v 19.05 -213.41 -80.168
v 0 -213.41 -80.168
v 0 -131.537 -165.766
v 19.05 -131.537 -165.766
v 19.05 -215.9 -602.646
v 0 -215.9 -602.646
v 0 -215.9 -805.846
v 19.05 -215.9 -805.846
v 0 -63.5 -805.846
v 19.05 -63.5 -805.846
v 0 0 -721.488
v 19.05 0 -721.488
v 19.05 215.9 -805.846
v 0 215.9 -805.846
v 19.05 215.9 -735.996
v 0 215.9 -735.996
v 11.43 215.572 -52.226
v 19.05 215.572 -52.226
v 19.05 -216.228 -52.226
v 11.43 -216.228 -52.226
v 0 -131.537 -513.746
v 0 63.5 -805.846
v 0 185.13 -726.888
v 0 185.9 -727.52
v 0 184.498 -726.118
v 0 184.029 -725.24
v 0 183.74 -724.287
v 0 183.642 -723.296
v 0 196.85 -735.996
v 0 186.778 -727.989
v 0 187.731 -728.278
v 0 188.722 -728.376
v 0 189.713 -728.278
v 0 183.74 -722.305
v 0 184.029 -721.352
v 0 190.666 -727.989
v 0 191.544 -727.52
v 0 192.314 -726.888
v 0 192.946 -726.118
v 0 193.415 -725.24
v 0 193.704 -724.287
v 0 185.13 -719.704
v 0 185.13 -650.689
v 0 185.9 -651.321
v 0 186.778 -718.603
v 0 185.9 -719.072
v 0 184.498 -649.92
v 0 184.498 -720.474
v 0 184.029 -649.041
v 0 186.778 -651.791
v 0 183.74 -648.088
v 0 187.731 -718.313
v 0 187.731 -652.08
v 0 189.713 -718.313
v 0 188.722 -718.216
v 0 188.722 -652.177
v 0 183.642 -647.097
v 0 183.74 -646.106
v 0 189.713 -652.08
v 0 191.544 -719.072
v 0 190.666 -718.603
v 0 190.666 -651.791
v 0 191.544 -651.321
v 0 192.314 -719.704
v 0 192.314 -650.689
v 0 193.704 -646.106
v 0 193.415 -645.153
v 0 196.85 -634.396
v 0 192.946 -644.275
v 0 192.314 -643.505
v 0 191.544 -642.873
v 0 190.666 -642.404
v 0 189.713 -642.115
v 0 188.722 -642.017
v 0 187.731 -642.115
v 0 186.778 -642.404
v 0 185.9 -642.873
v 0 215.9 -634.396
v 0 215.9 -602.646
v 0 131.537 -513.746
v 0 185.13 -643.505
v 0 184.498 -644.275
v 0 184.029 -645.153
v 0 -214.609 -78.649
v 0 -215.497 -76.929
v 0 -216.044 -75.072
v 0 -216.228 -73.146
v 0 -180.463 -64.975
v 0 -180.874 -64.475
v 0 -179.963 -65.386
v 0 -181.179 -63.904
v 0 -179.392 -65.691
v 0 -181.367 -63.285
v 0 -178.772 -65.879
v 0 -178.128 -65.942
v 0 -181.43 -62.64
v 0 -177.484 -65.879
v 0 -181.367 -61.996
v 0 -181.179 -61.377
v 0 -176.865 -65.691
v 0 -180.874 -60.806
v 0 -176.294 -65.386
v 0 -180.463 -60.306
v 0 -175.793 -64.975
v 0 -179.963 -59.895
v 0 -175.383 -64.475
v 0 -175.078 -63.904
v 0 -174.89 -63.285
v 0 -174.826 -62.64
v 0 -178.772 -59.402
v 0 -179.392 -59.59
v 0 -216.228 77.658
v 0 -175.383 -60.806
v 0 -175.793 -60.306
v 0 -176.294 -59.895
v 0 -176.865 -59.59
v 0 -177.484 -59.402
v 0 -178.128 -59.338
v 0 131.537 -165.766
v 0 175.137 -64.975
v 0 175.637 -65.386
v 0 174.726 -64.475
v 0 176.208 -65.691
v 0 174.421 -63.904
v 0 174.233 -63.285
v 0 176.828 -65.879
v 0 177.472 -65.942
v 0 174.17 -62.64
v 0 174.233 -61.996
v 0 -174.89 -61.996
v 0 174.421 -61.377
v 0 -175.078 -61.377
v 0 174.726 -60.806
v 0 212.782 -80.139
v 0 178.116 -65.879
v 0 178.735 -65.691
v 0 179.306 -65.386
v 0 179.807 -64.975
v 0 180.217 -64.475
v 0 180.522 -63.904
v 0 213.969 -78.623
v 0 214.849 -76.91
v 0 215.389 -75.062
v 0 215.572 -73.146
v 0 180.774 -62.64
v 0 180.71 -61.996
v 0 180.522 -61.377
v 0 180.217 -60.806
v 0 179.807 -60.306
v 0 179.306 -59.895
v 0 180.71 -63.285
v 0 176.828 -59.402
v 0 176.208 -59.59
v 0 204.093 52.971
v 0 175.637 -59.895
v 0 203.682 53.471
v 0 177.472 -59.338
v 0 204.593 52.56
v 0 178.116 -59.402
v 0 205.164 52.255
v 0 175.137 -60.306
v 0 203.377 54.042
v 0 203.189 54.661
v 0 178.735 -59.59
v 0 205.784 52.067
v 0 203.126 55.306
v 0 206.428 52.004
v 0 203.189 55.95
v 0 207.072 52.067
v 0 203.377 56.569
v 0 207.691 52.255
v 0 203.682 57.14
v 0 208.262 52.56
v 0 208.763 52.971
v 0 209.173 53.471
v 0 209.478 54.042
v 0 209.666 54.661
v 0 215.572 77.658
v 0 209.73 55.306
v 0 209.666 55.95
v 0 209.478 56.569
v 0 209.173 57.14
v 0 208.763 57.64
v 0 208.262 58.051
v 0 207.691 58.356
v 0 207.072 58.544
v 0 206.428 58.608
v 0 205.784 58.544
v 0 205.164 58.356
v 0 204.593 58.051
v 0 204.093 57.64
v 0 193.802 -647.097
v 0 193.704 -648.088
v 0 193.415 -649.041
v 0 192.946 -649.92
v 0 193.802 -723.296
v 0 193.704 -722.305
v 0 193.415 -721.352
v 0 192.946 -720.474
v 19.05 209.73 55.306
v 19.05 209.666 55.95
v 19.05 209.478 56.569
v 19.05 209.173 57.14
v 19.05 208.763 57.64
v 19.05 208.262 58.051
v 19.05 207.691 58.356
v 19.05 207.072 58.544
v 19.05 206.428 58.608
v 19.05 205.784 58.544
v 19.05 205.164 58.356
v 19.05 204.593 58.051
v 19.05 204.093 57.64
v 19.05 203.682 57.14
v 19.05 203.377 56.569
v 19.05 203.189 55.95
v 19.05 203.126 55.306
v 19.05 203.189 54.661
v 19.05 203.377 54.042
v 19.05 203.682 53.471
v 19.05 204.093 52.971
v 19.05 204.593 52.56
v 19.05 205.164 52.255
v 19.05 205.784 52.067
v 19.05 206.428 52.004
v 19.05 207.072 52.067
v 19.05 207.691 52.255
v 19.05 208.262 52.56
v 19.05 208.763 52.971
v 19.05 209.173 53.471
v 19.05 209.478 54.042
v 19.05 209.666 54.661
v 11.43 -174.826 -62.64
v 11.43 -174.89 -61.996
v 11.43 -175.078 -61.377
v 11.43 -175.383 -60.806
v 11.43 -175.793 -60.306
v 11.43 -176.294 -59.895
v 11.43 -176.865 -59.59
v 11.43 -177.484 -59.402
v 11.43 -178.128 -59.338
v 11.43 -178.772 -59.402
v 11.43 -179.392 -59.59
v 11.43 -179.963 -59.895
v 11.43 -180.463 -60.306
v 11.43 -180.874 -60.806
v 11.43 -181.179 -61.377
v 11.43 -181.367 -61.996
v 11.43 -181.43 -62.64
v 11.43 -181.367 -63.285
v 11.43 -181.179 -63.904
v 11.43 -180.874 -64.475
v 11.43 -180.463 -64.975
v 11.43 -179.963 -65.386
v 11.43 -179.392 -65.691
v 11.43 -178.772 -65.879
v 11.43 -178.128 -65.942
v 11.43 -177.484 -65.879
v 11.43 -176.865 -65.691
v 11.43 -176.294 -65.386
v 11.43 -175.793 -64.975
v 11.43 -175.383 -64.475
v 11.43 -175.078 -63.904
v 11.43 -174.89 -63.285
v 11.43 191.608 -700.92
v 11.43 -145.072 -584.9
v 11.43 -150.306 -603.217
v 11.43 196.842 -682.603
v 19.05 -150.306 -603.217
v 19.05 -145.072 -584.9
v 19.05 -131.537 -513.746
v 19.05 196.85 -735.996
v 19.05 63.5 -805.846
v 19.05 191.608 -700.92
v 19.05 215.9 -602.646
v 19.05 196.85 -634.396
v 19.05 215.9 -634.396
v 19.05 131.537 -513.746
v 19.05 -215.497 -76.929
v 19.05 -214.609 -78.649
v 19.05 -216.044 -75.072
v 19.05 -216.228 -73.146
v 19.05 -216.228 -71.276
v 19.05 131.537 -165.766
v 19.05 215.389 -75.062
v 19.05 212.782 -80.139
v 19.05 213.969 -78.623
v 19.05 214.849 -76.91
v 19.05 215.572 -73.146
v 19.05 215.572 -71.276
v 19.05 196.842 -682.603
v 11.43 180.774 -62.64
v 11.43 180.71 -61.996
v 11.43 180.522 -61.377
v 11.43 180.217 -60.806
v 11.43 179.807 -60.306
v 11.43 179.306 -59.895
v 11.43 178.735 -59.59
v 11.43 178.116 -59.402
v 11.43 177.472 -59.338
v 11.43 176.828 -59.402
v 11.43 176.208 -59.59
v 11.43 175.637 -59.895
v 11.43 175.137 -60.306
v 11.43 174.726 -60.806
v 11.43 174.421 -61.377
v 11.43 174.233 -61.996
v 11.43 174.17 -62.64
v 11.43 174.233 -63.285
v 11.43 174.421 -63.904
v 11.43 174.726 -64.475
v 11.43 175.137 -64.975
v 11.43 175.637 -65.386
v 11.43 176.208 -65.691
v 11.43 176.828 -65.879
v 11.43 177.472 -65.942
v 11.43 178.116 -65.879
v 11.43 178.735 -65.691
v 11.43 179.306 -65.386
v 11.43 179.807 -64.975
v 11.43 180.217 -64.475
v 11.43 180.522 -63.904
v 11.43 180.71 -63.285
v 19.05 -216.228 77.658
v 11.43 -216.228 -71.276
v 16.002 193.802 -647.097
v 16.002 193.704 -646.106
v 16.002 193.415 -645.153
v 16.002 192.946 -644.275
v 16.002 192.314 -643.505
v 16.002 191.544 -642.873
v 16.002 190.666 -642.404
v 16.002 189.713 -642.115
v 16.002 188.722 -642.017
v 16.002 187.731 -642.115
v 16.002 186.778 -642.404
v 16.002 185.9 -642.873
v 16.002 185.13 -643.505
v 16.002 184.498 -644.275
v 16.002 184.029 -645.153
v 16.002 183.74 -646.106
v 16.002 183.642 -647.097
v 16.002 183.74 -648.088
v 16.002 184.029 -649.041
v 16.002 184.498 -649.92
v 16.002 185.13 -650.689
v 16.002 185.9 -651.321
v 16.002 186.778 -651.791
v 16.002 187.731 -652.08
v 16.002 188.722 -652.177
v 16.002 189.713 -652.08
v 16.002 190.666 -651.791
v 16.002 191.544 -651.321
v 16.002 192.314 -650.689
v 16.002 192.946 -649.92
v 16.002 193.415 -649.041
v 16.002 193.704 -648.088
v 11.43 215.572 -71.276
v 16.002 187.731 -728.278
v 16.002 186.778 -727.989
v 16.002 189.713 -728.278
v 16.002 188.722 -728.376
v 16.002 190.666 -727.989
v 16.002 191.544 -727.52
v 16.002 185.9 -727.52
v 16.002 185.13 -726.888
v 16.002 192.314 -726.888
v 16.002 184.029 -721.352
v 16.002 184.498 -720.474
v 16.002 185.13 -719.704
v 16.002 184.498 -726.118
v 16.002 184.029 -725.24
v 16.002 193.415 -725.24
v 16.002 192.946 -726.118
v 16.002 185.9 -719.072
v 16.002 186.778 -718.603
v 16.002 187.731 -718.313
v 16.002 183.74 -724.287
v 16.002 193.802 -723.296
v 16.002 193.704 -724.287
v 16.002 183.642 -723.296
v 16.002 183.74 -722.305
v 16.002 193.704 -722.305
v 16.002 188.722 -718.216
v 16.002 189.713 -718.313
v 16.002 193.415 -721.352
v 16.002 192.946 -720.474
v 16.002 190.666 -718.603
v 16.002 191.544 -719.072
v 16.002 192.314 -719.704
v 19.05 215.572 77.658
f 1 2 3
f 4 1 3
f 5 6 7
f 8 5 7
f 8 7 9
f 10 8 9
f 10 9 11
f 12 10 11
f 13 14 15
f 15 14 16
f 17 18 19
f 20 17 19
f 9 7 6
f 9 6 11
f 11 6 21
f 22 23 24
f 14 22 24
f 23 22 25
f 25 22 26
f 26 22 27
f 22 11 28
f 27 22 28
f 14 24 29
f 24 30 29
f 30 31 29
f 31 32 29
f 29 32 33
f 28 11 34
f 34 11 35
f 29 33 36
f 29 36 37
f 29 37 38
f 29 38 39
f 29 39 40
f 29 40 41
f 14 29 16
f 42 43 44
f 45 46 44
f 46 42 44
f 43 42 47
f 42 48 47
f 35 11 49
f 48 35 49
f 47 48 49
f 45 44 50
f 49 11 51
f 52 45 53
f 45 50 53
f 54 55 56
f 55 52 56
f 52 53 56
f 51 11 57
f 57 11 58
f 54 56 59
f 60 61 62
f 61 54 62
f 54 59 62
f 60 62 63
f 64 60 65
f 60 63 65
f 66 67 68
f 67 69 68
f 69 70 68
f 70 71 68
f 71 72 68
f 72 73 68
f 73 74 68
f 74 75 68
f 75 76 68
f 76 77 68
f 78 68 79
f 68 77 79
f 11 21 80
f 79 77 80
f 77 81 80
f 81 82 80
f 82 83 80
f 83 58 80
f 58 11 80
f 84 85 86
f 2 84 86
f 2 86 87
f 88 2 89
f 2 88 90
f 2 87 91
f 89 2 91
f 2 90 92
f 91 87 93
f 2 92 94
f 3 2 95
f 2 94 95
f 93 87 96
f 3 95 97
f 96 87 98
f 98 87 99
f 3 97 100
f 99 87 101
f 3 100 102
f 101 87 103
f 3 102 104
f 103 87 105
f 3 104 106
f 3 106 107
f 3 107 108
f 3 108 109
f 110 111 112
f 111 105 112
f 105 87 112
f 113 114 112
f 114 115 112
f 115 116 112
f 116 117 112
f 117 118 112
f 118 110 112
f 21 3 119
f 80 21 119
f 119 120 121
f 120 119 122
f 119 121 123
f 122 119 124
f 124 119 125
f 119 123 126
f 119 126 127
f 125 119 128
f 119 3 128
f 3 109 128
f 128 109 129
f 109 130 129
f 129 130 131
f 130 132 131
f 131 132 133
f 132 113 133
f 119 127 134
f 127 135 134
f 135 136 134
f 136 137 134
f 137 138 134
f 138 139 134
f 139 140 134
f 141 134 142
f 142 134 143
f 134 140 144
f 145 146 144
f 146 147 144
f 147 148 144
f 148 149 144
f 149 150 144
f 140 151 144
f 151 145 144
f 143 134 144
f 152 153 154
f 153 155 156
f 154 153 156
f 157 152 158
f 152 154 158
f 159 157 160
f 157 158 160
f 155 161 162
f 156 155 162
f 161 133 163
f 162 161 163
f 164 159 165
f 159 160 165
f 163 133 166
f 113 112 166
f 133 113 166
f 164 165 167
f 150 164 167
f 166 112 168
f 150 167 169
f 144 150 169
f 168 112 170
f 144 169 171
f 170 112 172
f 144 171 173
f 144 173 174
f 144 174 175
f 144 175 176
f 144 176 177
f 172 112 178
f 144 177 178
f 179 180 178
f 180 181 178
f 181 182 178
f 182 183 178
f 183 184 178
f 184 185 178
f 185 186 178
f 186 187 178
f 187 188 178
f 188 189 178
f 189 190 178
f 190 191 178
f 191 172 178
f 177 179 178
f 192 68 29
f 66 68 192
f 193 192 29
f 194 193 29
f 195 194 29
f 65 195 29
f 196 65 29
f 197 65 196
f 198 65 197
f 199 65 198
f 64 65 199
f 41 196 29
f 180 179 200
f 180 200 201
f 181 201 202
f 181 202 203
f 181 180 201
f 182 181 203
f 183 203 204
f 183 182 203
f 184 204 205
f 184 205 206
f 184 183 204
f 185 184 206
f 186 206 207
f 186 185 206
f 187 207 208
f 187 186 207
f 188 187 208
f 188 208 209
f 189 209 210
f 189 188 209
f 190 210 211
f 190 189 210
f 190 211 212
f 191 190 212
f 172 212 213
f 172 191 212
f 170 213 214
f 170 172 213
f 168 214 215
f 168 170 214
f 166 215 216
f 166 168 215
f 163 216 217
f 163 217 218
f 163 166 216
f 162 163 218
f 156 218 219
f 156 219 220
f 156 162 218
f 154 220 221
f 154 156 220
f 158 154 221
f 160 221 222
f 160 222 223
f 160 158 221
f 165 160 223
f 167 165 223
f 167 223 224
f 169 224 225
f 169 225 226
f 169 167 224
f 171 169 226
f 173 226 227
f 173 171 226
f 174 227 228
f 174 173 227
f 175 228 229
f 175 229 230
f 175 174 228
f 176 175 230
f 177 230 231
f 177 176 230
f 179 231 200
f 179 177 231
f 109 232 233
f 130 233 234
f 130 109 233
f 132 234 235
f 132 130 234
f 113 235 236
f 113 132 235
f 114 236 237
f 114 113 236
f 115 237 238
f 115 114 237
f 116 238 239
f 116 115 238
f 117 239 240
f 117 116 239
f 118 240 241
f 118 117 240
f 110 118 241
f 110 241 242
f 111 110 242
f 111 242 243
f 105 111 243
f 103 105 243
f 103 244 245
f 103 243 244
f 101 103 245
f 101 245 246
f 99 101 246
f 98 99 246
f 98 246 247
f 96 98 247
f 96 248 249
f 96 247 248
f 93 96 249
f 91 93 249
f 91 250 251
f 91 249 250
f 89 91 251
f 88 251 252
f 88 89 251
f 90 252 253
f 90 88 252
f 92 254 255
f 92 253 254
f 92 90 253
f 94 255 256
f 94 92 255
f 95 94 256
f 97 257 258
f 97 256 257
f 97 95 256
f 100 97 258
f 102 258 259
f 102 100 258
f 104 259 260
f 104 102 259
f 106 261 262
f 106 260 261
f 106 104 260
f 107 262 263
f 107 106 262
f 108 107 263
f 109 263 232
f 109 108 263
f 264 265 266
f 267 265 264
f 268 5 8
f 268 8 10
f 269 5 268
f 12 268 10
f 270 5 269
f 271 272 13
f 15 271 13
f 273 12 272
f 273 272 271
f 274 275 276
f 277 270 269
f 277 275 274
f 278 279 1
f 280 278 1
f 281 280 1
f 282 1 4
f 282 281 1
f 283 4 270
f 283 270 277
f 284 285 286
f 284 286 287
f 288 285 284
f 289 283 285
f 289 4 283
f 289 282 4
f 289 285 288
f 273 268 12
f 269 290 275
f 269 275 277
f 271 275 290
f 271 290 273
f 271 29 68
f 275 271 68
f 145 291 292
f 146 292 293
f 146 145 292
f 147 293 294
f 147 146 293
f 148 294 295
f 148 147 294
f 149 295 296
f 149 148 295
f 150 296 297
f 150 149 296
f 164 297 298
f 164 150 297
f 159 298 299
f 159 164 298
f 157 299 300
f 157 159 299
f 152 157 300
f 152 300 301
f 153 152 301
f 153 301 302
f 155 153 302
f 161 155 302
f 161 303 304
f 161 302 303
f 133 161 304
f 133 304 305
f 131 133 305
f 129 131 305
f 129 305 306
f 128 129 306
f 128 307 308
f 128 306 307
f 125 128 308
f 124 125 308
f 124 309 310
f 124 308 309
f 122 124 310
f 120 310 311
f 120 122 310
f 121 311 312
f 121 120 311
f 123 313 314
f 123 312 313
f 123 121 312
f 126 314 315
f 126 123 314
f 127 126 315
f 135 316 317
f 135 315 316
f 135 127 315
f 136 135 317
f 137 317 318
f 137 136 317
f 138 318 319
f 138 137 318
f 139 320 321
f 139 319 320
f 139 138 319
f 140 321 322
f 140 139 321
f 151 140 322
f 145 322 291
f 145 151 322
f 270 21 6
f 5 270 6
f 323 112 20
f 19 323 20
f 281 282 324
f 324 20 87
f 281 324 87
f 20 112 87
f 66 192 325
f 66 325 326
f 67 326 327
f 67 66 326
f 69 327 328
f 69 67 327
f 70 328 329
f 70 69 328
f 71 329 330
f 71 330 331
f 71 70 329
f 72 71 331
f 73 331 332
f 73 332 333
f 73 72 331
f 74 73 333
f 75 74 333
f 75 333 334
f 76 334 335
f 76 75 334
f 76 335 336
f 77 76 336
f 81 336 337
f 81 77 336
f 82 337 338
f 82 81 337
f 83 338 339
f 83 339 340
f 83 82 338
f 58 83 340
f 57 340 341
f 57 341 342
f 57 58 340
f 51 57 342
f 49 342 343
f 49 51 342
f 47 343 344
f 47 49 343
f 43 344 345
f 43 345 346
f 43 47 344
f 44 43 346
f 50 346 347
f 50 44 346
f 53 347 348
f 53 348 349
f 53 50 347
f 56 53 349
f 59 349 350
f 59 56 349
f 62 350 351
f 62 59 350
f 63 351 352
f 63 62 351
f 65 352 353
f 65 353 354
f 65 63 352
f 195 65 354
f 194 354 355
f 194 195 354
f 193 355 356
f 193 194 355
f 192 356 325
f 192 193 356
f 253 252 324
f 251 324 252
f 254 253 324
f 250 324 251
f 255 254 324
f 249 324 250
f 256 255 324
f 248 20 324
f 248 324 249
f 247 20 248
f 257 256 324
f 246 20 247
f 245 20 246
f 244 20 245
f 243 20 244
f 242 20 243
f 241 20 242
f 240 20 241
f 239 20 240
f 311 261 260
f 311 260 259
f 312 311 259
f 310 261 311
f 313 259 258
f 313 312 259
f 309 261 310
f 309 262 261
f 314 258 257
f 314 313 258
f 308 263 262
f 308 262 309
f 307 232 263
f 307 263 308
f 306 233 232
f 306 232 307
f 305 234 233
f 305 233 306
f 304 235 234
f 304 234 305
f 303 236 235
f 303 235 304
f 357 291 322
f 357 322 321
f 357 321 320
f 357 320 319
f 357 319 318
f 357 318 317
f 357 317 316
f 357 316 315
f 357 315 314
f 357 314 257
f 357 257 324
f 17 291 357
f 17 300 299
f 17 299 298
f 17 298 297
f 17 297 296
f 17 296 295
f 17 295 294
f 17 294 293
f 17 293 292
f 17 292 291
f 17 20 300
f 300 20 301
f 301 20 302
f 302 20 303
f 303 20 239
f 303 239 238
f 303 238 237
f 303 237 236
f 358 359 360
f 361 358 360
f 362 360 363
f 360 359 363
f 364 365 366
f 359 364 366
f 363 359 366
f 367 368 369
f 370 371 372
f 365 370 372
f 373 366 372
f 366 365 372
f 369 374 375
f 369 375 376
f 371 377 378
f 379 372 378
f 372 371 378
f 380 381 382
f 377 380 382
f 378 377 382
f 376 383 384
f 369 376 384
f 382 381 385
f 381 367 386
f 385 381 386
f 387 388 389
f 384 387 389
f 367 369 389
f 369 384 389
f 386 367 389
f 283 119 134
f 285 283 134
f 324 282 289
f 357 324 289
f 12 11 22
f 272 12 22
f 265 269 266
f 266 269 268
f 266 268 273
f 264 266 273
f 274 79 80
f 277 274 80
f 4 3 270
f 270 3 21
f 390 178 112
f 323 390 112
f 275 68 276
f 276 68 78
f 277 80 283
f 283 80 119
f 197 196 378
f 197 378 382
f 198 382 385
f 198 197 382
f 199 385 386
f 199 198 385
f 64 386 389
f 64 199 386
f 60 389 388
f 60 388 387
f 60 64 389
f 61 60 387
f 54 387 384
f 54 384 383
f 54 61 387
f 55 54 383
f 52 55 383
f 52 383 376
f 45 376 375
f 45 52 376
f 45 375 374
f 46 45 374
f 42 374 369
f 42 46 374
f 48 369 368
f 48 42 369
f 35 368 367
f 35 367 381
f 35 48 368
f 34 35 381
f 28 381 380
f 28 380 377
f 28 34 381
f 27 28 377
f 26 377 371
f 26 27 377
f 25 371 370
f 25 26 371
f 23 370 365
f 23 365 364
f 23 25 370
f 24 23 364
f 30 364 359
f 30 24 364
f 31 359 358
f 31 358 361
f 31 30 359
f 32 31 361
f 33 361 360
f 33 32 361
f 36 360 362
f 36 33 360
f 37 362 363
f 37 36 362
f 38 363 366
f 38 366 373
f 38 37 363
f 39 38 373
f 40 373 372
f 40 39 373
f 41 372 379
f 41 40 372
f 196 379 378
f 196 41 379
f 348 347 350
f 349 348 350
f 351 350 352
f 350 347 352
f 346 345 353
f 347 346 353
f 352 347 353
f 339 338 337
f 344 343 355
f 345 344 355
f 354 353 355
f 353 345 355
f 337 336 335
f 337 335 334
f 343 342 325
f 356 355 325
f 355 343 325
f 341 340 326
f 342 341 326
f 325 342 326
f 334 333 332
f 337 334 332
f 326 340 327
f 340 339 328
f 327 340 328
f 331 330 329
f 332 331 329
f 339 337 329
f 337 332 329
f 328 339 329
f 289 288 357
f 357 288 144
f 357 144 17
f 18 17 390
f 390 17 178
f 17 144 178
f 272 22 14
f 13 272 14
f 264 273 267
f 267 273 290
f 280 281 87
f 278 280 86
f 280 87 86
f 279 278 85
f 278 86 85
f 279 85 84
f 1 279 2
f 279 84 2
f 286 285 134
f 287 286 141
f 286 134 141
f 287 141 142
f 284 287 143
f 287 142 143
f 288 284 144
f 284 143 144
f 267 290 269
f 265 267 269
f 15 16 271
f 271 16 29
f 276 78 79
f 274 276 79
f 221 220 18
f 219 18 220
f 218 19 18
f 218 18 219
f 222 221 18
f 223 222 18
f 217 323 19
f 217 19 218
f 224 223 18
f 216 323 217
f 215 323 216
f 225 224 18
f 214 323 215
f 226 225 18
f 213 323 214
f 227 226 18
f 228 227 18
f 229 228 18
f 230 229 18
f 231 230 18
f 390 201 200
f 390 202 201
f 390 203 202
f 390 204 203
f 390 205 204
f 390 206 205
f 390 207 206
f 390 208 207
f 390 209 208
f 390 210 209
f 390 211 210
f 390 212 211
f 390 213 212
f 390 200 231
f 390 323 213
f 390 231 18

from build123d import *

# Parameters (mm, degrees)
F1_DEPTH = 19.05
F3_DEPTH = 7.62
F5_DEPTH = 7.62
F6_R     = 3.302
F7_DEPTH = 19.05
F8_R     = 5.08
F9_DEPTH = 16.002


with BuildPart() as f1:
    # F0 (on Right) → F1 (new body)
    with BuildSketch(Plane.YZ):
        with BuildLine():
            Line((215.571838, -73.145718), (215.571838, 77.657629))
            Line((215.571838, 77.657629), (-216.228162, 77.657629))
            Line((-216.228162, 77.657629), (-216.228162, -73.145718))
            ThreePointArc((-216.228162, -73.145718), (-215.497416, -76.929203), (-213.410296, -80.168443))
            Line((-213.410296, -80.168443), (-131.536695, -165.765835))
            Line((-131.536695, -165.765835), (-131.536695, -513.745835))
            Line((-131.536695, -513.745835), (-215.9, -602.645835))
            Line((-215.9, -602.645835), (-215.9, -805.845835))
            Line((-215.9, -805.845835), (-63.5, -805.845835))
            Line((-63.5, -805.845835), (0, -721.487939))
            Line((0, -721.487939), (63.5, -805.845835))
            Line((63.5, -805.845835), (215.9, -805.845835))
            Line((215.9, -805.845835), (215.9, -735.995835))
            Line((215.9, -735.995835), (196.85, -735.995835))
            Line((196.85, -735.995835), (196.85, -634.395835))
            Line((196.85, -634.395835), (215.9, -634.395835))
            Line((215.9, -634.395835), (215.9, -602.645835))
            Line((215.9, -602.645835), (131.536695, -513.745835))
            Line((131.536695, -513.745835), (131.536695, -165.765835))
            Line((131.536695, -165.765835), (212.782136, -80.138879))
            ThreePointArc((212.782136, -80.138879), (214.848676, -76.910248), (215.571838, -73.145718))
        make_face()
    extrude(amount=F1_DEPTH)

    # F2 (on face) → F3 (cut)
    with BuildSketch(Plane.YZ.offset(19.05)):
        Polygon((191.608355, -700.919833), (196.842454, -682.602991), (-145.071934, -584.899811), (-150.306033, -603.216653), align=None)
    extrude(amount=-F3_DEPTH, mode=Mode.SUBTRACT)

    # F4 (on face) → F5 (cut)
    with BuildSketch(Plane.YZ.offset(19.05)):
        Polygon((-216.228162, -71.276438), (216.173725, -71.276438), (215.571838, -52.226438), (-216.228162, -52.226438), align=None)
    extrude(amount=-F5_DEPTH, mode=Mode.SUBTRACT)

    # F6 (on face) → F7 (cut)
    with BuildSketch(Plane.YZ):
        with Locations((-178.128162, -62.640438)):
            Circle(F6_R)
        with Locations((177.471838, -62.640438)):
            Circle(F6_R)
        with Locations((206.427838, 55.305629)):
            Circle(F6_R)
    extrude(amount=F7_DEPTH, mode=Mode.SUBTRACT)

    # F8 (on face) → F9 (cut)
    with BuildSketch(Plane.YZ):
        with Locations((188.722, -723.295835)):
            Circle(F8_R)
        with Locations((188.722, -647.097349)):
            Circle(F8_R)
    extrude(amount=F9_DEPTH, mode=Mode.SUBTRACT)


solid = f1.part
